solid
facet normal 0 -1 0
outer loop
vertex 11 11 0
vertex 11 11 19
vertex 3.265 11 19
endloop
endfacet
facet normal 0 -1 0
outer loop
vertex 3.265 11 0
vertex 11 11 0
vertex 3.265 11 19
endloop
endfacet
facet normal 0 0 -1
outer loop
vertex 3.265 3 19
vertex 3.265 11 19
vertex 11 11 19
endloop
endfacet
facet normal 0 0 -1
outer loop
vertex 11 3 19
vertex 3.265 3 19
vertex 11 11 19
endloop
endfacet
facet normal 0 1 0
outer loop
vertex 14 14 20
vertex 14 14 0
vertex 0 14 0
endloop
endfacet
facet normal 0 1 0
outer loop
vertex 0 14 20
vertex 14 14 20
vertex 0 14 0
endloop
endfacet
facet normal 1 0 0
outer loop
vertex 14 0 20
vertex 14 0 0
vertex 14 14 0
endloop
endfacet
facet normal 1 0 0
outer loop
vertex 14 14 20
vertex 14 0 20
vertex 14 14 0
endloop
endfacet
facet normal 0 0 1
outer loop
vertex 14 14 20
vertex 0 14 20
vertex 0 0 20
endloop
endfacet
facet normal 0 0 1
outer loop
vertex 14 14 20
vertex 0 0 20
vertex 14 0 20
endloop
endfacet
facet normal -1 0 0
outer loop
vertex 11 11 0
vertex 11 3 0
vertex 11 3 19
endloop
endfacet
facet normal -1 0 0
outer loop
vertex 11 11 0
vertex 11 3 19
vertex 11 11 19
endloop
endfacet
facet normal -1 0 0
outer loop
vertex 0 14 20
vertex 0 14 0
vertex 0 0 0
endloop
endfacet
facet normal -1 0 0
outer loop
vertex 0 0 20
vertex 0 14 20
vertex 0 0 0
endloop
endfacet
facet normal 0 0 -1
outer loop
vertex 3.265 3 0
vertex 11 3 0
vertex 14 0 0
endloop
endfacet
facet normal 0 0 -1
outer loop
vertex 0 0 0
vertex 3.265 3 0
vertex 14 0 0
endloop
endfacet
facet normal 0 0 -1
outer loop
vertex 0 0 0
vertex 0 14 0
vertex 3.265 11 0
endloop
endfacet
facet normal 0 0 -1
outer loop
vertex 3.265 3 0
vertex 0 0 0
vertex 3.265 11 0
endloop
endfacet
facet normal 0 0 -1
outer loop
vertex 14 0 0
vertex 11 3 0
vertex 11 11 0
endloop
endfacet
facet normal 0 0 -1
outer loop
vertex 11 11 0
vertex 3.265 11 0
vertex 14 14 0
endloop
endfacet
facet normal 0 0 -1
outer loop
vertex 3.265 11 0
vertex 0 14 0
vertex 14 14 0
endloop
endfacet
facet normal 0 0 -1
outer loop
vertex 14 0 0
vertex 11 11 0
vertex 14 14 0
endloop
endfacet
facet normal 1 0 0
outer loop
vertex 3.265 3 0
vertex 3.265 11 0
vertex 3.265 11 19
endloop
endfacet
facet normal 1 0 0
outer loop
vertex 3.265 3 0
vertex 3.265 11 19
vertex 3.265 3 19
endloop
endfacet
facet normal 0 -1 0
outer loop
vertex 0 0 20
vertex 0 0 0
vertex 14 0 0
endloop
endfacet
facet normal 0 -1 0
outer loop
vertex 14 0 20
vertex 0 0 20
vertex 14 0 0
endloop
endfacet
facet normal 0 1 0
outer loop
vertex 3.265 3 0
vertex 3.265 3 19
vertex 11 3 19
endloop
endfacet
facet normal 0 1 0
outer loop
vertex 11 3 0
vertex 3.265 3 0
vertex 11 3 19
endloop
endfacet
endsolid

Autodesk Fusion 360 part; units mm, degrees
sketch "Sketch1" plane through (0, 0, 0) normal (0, 0, 1) x (1, 0, 0)
  line L0 (0, 0) -> (14, 0)
  line L1 (14, 0) -> (14, 14)
  line L2 (14, 14) -> (0, 14)
  line L3 (0, 14) -> (0, 0)
  line L4 (11, 11) -> (3.2653, 11)
  line L5 (3.2653, 11) -> (3.2653, 2.9996)
  line L6 (3.2653, 2.9996) -> (11, 2.9996)
  line L7 (11, 2.9996) -> (11, 11)
  line L8 (11, 11) -> (3.2653, 2.9996) construction
  line L9 (3.2653, 11) -> (11, 2.9996) construction
  point P0 (7.1326, 6.9998)
extrude "Extrude1" add sketch "Sketch1" along normal blind 20 contours L0 L1 L2 L3 | L4 L5 L6 L7
extrude "Extrude2" cut sketch "Sketch1" along normal blind 19 contours L4 L5 L6 L7
